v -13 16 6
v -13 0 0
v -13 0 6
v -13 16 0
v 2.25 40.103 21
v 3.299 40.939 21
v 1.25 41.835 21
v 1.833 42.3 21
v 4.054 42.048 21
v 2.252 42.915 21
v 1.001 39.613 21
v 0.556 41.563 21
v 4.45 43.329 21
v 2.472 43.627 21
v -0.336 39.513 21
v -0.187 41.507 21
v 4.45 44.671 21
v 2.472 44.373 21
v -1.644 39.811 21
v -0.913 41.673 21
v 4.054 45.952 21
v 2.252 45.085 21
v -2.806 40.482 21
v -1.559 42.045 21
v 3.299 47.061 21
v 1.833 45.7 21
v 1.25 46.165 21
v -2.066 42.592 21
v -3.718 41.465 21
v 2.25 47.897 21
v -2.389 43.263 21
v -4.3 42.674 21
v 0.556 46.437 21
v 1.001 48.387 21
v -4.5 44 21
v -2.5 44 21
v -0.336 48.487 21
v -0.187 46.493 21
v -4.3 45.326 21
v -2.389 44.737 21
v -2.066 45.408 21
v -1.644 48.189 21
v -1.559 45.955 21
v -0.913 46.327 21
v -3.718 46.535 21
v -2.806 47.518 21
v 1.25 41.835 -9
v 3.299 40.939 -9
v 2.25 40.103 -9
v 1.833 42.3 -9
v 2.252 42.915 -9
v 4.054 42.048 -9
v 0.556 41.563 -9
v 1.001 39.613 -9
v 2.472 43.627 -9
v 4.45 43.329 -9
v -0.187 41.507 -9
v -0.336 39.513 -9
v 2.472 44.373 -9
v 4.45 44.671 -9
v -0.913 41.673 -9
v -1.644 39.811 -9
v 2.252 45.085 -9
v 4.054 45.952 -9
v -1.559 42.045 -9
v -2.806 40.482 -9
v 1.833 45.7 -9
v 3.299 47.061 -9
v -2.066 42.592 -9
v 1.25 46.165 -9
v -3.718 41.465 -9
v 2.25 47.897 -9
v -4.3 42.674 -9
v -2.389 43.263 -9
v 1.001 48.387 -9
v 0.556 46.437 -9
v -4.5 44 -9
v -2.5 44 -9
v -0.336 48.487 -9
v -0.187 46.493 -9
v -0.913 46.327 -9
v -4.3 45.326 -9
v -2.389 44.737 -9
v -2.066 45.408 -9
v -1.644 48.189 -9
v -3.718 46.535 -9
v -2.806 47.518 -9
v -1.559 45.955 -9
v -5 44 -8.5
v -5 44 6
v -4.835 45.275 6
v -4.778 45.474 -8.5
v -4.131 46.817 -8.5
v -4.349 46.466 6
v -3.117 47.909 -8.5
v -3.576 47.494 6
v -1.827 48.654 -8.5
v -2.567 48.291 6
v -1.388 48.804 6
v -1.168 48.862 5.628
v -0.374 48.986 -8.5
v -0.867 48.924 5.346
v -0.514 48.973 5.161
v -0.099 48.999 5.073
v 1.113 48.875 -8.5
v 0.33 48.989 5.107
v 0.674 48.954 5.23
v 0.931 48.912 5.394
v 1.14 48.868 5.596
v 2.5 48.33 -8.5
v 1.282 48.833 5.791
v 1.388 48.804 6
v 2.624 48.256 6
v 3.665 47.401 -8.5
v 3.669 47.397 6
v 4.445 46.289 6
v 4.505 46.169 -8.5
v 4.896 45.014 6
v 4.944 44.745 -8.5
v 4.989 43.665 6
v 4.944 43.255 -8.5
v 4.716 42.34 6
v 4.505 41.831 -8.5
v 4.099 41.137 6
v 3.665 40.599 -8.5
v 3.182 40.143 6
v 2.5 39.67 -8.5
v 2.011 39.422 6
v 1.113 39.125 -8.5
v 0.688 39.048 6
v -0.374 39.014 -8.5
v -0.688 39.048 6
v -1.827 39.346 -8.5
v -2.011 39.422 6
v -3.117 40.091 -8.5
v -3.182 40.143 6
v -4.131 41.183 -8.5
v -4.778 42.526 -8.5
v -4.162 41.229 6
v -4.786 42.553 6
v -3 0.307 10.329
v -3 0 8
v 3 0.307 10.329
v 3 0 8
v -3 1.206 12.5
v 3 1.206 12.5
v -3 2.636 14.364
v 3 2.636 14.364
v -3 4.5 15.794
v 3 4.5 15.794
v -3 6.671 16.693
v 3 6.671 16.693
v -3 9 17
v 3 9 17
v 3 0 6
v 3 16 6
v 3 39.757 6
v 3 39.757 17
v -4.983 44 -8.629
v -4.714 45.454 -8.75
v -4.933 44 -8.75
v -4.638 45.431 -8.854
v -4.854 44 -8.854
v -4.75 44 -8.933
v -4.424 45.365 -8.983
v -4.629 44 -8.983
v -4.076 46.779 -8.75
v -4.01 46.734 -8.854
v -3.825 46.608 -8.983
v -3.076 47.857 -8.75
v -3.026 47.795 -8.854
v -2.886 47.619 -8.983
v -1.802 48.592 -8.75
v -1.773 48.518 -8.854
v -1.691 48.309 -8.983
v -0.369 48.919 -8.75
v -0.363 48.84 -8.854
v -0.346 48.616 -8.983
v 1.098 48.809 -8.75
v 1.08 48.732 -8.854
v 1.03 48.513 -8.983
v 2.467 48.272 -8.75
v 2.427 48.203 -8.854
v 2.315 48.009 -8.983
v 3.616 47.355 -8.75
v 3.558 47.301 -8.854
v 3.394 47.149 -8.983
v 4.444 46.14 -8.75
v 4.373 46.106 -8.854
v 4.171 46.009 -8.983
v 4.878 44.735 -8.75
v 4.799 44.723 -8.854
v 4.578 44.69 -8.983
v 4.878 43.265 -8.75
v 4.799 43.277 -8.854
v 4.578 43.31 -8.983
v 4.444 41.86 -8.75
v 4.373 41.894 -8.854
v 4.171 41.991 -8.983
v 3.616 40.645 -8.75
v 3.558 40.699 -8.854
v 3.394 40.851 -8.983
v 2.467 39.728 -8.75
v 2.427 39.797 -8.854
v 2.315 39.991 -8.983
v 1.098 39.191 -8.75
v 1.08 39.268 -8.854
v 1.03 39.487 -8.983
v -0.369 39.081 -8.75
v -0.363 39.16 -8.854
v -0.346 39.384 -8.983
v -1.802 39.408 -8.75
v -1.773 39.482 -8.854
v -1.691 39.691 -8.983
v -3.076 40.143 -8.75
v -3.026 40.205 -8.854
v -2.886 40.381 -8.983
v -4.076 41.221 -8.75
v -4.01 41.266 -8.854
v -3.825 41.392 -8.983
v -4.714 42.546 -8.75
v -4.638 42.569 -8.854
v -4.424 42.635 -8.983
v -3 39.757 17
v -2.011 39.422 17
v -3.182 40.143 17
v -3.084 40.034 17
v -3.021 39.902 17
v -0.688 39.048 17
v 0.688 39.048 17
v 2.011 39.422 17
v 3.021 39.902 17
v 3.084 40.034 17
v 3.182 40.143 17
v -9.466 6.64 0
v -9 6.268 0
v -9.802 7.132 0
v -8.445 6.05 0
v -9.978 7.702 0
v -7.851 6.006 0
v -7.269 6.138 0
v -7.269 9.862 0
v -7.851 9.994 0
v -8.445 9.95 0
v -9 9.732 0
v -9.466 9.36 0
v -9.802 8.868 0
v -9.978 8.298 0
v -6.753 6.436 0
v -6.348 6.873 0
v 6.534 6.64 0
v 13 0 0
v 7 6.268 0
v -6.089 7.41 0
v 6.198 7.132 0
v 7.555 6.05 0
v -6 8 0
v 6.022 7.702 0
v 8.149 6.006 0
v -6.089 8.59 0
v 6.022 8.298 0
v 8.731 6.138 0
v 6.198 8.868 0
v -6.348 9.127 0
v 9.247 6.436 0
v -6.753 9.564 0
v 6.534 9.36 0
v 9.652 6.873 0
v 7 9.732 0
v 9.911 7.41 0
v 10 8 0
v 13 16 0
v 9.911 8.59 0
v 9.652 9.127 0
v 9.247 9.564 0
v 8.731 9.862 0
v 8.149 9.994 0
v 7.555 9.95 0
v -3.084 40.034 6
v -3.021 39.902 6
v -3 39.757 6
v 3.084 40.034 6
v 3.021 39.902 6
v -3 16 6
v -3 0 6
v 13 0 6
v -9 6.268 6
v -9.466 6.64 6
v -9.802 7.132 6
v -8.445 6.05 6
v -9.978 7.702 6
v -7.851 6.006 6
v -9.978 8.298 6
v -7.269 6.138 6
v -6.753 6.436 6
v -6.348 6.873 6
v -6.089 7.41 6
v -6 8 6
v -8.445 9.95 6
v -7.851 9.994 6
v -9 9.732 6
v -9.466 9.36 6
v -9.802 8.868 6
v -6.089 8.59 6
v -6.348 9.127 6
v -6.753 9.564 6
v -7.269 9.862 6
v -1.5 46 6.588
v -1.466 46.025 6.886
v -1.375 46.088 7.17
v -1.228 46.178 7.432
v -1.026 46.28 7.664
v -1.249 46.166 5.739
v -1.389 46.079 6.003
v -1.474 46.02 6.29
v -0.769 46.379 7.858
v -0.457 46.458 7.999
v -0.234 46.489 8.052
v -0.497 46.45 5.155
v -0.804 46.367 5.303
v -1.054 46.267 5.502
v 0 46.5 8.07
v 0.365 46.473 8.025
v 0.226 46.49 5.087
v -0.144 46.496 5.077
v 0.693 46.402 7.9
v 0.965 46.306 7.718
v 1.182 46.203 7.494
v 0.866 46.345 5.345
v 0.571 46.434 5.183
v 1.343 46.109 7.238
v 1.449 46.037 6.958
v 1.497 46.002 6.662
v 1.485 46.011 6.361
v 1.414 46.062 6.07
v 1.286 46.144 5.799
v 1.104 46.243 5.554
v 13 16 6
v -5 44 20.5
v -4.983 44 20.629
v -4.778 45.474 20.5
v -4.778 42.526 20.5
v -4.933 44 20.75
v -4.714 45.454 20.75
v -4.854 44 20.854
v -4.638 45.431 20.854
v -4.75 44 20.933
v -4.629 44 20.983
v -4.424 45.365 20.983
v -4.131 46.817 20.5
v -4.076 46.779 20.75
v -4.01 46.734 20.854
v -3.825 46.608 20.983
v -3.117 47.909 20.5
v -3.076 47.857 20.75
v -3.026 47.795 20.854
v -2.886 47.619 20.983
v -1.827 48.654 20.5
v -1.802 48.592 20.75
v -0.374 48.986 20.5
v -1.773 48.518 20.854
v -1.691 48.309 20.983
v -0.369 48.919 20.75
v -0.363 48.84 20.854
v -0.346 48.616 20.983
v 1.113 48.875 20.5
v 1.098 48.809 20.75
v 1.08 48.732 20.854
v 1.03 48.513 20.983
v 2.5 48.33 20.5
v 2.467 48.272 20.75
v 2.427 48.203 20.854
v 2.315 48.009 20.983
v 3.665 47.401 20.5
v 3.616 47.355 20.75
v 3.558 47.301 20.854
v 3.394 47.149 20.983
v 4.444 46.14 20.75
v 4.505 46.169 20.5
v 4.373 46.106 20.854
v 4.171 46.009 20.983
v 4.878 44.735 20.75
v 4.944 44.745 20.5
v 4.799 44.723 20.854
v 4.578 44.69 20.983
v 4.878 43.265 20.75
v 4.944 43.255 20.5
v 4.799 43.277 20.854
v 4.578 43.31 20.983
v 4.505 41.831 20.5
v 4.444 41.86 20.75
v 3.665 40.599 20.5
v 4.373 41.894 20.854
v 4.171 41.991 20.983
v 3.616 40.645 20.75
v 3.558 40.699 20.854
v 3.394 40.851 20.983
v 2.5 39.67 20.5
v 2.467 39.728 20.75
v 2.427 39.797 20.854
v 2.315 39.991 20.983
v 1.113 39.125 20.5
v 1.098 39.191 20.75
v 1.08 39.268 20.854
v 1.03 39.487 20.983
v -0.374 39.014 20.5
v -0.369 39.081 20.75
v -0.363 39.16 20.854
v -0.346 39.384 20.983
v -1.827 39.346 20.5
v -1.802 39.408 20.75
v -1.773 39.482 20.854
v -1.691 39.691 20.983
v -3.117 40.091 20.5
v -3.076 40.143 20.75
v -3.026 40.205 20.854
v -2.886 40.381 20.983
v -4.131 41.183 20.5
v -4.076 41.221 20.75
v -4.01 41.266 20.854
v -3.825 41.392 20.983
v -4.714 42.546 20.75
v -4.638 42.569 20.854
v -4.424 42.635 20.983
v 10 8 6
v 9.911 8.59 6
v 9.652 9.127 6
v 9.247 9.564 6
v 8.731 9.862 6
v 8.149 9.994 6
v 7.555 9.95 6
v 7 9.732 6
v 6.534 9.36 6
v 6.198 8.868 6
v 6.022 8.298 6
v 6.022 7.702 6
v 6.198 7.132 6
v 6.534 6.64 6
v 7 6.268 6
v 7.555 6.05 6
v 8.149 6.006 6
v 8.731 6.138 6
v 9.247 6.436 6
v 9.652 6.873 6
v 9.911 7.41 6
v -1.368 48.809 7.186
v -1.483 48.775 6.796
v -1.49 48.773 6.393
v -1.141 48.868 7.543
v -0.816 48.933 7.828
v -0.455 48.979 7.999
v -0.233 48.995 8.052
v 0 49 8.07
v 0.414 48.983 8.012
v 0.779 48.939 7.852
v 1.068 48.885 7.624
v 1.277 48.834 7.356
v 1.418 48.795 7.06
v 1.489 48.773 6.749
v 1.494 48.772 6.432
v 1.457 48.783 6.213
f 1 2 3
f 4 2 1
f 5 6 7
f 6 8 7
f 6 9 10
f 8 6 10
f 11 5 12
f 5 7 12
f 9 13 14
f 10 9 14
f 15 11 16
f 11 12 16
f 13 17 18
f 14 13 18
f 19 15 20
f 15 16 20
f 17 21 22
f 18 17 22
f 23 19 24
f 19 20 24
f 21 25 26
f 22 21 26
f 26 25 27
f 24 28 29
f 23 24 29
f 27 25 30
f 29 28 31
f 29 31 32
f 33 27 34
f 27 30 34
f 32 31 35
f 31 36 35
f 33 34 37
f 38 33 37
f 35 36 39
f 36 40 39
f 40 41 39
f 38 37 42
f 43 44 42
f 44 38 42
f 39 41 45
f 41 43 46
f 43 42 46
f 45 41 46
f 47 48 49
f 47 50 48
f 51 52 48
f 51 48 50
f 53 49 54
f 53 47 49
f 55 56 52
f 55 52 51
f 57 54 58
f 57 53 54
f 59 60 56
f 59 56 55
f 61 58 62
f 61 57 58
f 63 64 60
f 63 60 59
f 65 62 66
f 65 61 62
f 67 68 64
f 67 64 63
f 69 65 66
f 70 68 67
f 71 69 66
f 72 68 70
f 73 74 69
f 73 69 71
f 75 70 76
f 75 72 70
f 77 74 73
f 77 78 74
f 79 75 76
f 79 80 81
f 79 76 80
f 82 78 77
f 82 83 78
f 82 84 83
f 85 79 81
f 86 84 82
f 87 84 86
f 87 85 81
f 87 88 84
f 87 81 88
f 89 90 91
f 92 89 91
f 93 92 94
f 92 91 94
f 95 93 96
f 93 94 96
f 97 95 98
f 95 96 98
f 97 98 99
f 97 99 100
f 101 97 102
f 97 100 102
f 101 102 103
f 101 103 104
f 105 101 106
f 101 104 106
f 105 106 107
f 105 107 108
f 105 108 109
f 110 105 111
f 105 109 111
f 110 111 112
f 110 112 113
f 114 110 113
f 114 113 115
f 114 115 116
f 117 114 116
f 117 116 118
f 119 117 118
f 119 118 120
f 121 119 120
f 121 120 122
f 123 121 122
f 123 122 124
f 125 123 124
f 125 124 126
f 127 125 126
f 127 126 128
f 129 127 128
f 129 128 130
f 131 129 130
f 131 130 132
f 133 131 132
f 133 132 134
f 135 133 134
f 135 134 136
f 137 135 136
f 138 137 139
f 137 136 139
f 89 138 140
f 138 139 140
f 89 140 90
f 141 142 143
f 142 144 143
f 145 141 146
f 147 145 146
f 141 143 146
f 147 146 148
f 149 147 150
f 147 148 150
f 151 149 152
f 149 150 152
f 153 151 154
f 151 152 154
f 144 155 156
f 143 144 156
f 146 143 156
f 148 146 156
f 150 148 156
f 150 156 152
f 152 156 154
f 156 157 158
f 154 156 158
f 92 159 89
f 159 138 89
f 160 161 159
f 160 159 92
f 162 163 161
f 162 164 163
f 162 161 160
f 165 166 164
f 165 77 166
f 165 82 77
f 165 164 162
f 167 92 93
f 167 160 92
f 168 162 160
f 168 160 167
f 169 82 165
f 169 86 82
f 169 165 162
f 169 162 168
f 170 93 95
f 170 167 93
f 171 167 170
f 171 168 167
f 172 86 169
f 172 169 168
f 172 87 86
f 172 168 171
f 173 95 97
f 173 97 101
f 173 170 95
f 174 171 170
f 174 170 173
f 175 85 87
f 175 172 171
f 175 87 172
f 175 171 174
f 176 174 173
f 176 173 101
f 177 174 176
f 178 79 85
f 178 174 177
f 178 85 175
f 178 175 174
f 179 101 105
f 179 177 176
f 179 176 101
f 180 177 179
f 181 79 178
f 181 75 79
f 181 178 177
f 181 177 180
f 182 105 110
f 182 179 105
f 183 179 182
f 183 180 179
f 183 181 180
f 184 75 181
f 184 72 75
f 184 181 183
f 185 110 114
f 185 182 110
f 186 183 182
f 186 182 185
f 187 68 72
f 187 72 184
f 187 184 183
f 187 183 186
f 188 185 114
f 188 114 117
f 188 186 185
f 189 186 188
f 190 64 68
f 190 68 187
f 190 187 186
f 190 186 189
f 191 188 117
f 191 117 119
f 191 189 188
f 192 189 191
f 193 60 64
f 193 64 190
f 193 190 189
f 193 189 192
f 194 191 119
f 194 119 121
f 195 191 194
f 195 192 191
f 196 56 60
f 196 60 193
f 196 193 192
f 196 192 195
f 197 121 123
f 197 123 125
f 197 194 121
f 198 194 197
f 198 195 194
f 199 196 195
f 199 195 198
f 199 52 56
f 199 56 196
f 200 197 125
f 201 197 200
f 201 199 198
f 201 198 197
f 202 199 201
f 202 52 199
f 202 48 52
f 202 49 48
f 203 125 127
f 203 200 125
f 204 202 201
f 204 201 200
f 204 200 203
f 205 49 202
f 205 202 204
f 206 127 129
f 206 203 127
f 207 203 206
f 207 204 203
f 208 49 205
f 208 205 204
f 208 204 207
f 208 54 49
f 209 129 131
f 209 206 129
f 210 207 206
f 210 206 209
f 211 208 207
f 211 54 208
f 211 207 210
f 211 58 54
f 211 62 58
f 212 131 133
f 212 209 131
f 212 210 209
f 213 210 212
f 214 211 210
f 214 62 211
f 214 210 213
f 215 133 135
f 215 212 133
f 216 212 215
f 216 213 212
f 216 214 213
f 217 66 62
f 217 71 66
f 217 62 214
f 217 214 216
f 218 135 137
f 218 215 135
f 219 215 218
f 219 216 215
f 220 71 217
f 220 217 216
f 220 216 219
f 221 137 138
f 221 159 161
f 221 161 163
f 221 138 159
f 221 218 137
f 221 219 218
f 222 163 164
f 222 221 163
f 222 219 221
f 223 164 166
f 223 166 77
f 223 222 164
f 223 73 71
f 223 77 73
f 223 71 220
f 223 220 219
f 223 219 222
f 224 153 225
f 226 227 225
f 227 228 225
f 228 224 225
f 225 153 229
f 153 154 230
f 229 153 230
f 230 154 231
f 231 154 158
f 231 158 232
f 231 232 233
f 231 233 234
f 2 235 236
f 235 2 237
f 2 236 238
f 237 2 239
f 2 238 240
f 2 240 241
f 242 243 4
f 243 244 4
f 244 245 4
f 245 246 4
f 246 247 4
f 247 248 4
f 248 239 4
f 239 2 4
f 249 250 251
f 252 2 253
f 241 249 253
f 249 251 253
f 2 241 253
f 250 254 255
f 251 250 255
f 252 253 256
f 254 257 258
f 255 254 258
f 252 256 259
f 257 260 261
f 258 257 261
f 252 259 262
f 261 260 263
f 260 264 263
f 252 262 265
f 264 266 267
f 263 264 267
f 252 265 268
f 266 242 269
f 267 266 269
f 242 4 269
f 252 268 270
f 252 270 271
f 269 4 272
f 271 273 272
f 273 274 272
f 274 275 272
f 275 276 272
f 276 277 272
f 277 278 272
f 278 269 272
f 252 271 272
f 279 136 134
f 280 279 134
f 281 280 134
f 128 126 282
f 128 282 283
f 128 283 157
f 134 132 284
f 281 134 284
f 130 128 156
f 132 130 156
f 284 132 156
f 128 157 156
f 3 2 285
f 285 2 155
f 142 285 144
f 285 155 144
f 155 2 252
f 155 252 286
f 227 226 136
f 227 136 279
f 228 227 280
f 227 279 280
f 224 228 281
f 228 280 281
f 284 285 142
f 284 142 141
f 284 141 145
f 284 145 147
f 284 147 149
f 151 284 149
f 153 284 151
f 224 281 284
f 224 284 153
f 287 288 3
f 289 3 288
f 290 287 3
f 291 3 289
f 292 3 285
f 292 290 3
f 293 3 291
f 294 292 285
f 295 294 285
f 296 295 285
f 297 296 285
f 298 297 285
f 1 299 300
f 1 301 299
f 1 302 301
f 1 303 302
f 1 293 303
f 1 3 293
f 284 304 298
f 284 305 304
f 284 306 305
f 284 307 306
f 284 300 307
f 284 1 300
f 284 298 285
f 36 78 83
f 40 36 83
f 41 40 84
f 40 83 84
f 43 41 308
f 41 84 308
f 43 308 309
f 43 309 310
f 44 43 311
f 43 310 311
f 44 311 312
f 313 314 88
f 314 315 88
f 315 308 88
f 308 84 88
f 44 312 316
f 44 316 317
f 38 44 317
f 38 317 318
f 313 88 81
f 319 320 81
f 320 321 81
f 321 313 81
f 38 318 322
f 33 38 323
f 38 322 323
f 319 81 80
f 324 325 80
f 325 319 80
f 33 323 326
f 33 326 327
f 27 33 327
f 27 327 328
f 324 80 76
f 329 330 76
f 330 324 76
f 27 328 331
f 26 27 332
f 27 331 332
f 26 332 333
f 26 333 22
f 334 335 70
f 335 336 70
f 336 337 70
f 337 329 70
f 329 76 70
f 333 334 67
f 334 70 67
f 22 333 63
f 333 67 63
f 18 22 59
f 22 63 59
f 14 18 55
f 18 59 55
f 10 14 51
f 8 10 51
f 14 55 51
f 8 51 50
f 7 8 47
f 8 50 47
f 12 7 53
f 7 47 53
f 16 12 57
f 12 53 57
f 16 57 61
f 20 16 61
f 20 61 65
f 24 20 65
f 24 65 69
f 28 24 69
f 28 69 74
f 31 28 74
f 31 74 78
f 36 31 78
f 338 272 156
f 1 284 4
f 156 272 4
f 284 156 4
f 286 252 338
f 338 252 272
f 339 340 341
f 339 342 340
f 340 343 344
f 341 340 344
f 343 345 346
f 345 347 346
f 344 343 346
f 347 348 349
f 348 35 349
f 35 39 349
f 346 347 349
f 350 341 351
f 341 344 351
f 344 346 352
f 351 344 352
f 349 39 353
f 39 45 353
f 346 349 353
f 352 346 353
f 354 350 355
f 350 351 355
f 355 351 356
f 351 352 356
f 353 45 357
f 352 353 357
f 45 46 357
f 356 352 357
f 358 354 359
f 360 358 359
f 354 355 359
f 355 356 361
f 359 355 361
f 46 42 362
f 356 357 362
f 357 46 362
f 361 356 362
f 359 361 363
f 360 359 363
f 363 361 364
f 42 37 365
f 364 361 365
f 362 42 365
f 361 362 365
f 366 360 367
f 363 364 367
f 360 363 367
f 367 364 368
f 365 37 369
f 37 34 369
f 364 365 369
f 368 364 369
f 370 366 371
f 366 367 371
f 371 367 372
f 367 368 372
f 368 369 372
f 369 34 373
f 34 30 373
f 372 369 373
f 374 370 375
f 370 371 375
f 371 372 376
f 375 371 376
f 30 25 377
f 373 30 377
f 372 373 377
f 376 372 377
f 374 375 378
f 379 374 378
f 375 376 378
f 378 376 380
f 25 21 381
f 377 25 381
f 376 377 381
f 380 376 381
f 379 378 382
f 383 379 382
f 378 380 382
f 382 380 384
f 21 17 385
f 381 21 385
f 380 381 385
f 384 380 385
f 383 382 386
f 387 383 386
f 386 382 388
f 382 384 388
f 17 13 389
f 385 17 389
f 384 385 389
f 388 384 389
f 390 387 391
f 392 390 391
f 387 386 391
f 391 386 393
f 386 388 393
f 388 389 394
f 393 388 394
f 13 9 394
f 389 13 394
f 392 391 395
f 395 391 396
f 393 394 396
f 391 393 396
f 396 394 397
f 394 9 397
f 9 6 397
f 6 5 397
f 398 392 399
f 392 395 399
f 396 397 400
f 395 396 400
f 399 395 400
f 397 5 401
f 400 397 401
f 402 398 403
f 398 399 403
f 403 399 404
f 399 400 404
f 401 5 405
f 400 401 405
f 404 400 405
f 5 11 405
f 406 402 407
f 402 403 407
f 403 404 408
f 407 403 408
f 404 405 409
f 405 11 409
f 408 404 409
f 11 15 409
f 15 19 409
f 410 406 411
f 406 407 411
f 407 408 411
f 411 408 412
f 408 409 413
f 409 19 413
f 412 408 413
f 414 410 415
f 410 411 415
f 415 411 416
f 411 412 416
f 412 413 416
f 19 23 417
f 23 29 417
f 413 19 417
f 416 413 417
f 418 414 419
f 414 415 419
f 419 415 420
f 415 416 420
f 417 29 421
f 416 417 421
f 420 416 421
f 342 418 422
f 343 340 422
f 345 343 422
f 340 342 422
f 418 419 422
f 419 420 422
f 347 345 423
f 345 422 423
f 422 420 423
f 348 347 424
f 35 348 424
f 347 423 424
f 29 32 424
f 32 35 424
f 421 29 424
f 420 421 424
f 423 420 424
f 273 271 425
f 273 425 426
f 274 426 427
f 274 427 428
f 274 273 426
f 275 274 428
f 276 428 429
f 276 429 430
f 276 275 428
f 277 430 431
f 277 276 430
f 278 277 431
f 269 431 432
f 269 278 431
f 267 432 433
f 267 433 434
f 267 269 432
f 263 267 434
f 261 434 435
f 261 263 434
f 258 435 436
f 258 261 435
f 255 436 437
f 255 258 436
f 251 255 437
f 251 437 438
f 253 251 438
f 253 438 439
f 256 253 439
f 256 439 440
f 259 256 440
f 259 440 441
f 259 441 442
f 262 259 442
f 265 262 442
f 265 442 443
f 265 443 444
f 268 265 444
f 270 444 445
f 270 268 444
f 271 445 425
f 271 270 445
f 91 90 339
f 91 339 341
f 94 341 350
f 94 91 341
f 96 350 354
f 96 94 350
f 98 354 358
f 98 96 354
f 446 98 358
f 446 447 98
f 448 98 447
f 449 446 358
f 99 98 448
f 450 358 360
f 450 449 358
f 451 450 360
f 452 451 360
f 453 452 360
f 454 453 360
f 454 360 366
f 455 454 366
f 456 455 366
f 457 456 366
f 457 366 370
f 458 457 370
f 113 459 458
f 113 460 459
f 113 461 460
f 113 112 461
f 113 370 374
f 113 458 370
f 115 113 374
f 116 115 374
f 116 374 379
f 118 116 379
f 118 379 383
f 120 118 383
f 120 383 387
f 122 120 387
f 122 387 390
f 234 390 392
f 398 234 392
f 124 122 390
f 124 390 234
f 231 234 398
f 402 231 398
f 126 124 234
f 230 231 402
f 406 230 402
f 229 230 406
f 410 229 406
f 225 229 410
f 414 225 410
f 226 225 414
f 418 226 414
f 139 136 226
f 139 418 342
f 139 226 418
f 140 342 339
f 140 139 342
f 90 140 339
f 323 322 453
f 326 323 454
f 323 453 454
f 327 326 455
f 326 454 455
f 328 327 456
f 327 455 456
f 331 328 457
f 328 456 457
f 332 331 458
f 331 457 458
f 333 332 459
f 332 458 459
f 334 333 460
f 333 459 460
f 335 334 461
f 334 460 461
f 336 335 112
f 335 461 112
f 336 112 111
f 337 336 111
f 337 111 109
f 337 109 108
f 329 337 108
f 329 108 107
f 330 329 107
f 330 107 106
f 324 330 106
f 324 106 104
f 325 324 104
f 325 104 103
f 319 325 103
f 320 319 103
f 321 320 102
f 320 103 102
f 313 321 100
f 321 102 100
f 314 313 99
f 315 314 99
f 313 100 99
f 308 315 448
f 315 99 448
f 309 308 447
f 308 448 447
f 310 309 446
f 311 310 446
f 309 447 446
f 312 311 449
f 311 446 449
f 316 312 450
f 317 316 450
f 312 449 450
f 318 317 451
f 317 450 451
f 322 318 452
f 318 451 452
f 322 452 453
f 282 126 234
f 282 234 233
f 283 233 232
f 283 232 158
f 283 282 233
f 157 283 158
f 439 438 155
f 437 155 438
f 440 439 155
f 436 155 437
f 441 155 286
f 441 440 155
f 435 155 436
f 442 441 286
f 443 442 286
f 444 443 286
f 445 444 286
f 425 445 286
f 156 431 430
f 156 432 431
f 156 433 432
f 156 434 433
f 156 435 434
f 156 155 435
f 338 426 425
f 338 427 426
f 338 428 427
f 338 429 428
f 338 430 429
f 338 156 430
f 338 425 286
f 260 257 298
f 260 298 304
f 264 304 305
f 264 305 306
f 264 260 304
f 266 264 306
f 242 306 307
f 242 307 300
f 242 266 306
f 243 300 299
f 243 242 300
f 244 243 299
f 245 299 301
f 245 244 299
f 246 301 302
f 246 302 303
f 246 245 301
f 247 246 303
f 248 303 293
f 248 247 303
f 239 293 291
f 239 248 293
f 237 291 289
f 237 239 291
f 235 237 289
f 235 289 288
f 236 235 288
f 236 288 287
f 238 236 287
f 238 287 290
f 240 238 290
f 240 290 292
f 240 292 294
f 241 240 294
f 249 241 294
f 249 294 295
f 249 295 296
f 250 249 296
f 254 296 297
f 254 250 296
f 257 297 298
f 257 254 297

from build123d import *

# Parameters (mm, degrees)
SKETCH2_W                = 13
SKETCH2_H                = 16
SKETCH2_R                = 2
BOSS_EXTRUDE1_DEPTH      = 6
BOSS_EXTRUDE2_DEPTH      = 3
BOSS_EXTRUDE2_DEPTH_BACK = 3
SKETCH6_R                = 5
BOSS_EXTRUDE4_DEPTH      = 15
BOSS_EXTRUDE4_DEPTH_BACK = 15
SKETCH7_R                = 2.5
CUT_EXTRUDE2_DEPTH       = 31
FILLET3_R                = 0.5
FILLET4_R                = 0.5
SKETCH10_R               = 1.5
CUT_EXTRUDE3_DEPTH       = 4


with BuildPart() as part:
    # Sketch2 → Boss-Extrude1 (new body)
    with BuildSketch(Plane.XY):
        with Locations((-6.5, 8)):
            Rectangle(SKETCH2_W, SKETCH2_H)
        with Locations((-8, 8)):
            Circle(SKETCH2_R, mode=Mode.SUBTRACT)
        with Locations((6.5, 8)):
            Rectangle(SKETCH2_W, SKETCH2_H)
        with Locations((8, 8)):
            Circle(SKETCH2_R, mode=Mode.SUBTRACT)
    extrude(amount=BOSS_EXTRUDE1_DEPTH)

    # Sketch3 → Boss-Extrude2 (add, two sides)
    with BuildSketch(Plane(origin=(0, 0, 0), x_dir=(0, 0, -1), z_dir=(1, 0, 0))) as boss_extrude2_sk:
        with BuildLine():
            Line((-6, 0), (-8, 0))
            ThreePointArc((-8, 0), (-14.363961031, 2.636038969), (-17, 9))
            Line((-17, 9), (-17, 44))
            Line((-17, 44), (-6, 44))
            Line((-6, 44), (-6, 16))
            Line((-6, 16), (-6, 0))
        make_face()
    extrude(amount=BOSS_EXTRUDE2_DEPTH)
    extrude(boss_extrude2_sk.sketch, amount=-BOSS_EXTRUDE2_DEPTH_BACK)

    # Sketch6 → Boss-Extrude4 (add, two sides)
    with BuildSketch(Plane(origin=(0, 0, 6), x_dir=(-1, 0, 0), z_dir=(0, 0, -1))) as boss_extrude4_sk:
        with Locations((0, 44)):
            Circle(SKETCH6_R)
    extrude(amount=BOSS_EXTRUDE4_DEPTH)
    extrude(boss_extrude4_sk.sketch, amount=-BOSS_EXTRUDE4_DEPTH_BACK)

    # Sketch7 → Cut-Extrude2 (cut, through all)
    with BuildSketch(Plane(origin=(0, 0, -9), x_dir=(-1, 0, 0), z_dir=(0, 0, -1))):
        with Locations((0, 44)):
            Circle(SKETCH7_R)
    extrude(amount=-CUT_EXTRUDE2_DEPTH, mode=Mode.SUBTRACT)

    # Fillet3
    fillet3_edges = [part.edges().sort_by_distance(p)[0] for p in [
        (5, 44, 21),
        (5, 44, -9),
    ]]
    fillet(fillet3_edges, radius=FILLET3_R)

    # Fillet4
    fillet4_edges = [part.edges().sort_by_distance(p)[0] for p in [
        (3, 40, 11.5),
        (-3, 40, 11.5),
    ]]
    fillet(fillet4_edges, radius=FILLET4_R)

    # Sketch10 → Cut-Extrude3 (cut)
    with BuildSketch(Plane.ZX.offset(49)):
        with Locations((6.569879023, 0)):
            Circle(SKETCH10_R)
    extrude(amount=-CUT_EXTRUDE3_DEPTH, mode=Mode.SUBTRACT)


solid = part.part
